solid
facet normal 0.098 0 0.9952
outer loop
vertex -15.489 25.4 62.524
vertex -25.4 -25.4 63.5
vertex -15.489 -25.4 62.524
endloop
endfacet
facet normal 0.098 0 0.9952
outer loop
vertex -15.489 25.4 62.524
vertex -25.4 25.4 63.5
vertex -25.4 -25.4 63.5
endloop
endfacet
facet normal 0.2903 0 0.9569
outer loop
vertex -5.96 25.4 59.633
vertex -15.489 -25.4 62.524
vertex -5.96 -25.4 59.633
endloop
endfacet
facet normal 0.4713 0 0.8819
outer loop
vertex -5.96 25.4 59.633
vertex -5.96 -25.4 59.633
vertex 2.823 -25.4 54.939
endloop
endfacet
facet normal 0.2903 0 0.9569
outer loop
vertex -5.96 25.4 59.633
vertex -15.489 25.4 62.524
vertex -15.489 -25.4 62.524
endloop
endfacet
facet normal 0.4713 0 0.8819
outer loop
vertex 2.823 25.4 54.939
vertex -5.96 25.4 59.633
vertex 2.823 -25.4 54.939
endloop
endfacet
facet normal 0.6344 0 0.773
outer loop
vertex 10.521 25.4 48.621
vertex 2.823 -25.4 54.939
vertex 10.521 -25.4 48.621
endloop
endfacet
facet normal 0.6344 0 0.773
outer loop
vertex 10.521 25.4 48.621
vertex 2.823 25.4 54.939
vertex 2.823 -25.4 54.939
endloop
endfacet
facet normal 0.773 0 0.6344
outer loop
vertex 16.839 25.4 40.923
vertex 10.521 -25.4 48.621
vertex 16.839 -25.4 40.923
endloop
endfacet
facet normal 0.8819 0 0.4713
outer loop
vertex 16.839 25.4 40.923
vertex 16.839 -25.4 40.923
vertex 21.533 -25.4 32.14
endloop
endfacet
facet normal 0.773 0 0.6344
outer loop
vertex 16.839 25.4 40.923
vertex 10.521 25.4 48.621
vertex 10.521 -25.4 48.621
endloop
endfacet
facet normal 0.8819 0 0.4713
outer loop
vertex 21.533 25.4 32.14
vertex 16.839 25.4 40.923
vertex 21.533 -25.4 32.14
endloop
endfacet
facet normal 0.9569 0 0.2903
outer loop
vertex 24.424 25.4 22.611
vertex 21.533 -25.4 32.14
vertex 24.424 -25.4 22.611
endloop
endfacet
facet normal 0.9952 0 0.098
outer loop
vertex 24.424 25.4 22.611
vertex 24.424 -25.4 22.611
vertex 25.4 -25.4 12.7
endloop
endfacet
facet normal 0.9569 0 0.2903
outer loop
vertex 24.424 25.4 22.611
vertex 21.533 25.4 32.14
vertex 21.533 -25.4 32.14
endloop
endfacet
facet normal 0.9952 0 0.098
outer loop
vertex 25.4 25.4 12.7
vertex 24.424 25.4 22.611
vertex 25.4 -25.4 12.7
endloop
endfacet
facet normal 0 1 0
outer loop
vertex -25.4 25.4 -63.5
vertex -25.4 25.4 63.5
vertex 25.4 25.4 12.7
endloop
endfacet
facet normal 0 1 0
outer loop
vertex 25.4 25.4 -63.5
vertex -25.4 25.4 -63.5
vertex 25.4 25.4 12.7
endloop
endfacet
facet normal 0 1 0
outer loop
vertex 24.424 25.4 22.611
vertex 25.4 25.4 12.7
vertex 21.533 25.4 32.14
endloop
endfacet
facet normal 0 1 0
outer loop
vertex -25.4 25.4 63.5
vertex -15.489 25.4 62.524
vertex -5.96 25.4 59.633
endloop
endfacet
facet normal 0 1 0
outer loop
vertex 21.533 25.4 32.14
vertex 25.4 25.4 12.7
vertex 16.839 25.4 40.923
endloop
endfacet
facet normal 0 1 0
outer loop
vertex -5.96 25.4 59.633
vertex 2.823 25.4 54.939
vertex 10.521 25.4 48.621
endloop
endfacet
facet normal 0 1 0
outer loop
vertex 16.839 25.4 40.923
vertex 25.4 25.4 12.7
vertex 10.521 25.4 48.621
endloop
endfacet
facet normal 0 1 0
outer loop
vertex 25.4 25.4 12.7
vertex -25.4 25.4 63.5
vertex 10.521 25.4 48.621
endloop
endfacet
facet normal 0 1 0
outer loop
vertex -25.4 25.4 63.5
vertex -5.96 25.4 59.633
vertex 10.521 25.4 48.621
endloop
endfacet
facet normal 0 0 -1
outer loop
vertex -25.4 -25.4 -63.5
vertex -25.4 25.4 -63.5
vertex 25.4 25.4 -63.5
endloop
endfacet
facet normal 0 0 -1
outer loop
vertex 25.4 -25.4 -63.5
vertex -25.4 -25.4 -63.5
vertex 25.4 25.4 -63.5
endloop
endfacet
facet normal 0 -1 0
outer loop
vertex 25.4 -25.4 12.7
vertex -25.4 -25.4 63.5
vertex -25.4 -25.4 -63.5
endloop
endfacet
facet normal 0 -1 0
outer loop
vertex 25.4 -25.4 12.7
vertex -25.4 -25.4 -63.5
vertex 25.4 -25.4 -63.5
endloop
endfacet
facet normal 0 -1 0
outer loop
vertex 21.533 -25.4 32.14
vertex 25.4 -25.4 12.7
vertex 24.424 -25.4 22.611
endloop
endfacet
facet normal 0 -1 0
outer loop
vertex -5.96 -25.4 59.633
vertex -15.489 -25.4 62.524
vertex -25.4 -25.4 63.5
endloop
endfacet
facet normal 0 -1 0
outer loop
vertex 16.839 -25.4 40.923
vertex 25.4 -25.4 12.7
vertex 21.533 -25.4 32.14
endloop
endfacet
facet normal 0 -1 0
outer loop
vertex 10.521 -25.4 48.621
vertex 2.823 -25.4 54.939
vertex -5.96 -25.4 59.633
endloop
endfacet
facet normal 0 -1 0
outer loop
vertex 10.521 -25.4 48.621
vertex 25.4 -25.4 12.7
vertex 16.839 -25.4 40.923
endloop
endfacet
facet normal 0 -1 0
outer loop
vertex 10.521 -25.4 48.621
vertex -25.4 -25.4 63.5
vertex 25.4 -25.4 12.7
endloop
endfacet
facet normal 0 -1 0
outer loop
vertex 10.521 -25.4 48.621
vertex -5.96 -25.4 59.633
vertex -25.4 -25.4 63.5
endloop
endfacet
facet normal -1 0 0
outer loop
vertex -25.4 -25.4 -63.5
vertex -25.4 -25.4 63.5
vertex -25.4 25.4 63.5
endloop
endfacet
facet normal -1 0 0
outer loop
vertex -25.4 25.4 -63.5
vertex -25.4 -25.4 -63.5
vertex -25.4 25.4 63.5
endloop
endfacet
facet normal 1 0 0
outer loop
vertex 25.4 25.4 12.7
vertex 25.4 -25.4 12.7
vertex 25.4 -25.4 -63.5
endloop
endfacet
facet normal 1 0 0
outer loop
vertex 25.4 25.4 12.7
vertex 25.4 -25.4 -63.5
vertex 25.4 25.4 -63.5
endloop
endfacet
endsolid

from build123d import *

# Parameters (mm, degrees)
F0_W     = 50.8
F0_H     = 50.8
F1_DEPTH = 63.5
F2_R     = 50.79999


# Not quite as in the source:
# - a fillet or chamfer is up to 0.001 mm smaller than in the source, because OpenCascade refuses the exact size


with BuildPart() as f1:
    # F0 (on Top) → F1 (new body, symmetric)
    with BuildSketch(Plane.XY):
        Rectangle(F0_W, F0_H)
    extrude(amount=F1_DEPTH, both=True)

    # F2 (radius 50.8 in the source; OpenCascade refuses exactly that, so slightly less here)
    f2_edges = [f1.edges().sort_by_distance(p)[0] for p in [
        (25.4, 0, 63.5),
    ]]
    fillet(f2_edges, radius=F2_R)


solid = f1.part
